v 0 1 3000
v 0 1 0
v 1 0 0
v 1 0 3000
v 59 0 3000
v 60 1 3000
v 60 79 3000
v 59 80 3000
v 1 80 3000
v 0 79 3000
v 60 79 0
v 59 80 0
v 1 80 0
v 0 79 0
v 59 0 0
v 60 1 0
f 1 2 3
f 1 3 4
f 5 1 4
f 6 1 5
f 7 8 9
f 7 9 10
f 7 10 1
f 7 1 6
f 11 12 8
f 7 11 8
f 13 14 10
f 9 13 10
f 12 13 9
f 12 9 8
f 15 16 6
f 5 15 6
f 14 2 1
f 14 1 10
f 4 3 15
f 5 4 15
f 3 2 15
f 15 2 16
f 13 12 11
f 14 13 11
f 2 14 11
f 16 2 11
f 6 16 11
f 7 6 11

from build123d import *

# Parameters (mm, degrees)
F0_W     = 60
F0_H     = 80
F1_DEPTH = 3000
F2_SIZE  = 1
F3_SIZE  = 1
F4_SIZE  = 1
F5_SIZE  = 1


with BuildPart() as f1:
    # F0 (on Top) → F1 (new body)
    with BuildSketch(Plane.XY):
        with Locations((30, 40)):
            Rectangle(F0_W, F0_H)
    extrude(amount=F1_DEPTH)

    # F2
    f2_edges = [f1.edges().sort_by_distance(p)[0] for p in [
        (60, 0, 1500),
    ]]
    chamfer(f2_edges, length=F2_SIZE)

    # F3
    f3_edges = [f1.edges().sort_by_distance(p)[0] for p in [
        (0, 0, 1500),
    ]]
    chamfer(f3_edges, length=F3_SIZE)

    # F4
    f4_edges = [f1.edges().sort_by_distance(p)[0] for p in [
        (60, 80, 1500),
    ]]
    chamfer(f4_edges, length=F4_SIZE)

    # F5
    f5_edges = [f1.edges().sort_by_distance(p)[0] for p in [
        (0, 80, 1500),
    ]]
    chamfer(f5_edges, length=F5_SIZE)


solid = f1.part
